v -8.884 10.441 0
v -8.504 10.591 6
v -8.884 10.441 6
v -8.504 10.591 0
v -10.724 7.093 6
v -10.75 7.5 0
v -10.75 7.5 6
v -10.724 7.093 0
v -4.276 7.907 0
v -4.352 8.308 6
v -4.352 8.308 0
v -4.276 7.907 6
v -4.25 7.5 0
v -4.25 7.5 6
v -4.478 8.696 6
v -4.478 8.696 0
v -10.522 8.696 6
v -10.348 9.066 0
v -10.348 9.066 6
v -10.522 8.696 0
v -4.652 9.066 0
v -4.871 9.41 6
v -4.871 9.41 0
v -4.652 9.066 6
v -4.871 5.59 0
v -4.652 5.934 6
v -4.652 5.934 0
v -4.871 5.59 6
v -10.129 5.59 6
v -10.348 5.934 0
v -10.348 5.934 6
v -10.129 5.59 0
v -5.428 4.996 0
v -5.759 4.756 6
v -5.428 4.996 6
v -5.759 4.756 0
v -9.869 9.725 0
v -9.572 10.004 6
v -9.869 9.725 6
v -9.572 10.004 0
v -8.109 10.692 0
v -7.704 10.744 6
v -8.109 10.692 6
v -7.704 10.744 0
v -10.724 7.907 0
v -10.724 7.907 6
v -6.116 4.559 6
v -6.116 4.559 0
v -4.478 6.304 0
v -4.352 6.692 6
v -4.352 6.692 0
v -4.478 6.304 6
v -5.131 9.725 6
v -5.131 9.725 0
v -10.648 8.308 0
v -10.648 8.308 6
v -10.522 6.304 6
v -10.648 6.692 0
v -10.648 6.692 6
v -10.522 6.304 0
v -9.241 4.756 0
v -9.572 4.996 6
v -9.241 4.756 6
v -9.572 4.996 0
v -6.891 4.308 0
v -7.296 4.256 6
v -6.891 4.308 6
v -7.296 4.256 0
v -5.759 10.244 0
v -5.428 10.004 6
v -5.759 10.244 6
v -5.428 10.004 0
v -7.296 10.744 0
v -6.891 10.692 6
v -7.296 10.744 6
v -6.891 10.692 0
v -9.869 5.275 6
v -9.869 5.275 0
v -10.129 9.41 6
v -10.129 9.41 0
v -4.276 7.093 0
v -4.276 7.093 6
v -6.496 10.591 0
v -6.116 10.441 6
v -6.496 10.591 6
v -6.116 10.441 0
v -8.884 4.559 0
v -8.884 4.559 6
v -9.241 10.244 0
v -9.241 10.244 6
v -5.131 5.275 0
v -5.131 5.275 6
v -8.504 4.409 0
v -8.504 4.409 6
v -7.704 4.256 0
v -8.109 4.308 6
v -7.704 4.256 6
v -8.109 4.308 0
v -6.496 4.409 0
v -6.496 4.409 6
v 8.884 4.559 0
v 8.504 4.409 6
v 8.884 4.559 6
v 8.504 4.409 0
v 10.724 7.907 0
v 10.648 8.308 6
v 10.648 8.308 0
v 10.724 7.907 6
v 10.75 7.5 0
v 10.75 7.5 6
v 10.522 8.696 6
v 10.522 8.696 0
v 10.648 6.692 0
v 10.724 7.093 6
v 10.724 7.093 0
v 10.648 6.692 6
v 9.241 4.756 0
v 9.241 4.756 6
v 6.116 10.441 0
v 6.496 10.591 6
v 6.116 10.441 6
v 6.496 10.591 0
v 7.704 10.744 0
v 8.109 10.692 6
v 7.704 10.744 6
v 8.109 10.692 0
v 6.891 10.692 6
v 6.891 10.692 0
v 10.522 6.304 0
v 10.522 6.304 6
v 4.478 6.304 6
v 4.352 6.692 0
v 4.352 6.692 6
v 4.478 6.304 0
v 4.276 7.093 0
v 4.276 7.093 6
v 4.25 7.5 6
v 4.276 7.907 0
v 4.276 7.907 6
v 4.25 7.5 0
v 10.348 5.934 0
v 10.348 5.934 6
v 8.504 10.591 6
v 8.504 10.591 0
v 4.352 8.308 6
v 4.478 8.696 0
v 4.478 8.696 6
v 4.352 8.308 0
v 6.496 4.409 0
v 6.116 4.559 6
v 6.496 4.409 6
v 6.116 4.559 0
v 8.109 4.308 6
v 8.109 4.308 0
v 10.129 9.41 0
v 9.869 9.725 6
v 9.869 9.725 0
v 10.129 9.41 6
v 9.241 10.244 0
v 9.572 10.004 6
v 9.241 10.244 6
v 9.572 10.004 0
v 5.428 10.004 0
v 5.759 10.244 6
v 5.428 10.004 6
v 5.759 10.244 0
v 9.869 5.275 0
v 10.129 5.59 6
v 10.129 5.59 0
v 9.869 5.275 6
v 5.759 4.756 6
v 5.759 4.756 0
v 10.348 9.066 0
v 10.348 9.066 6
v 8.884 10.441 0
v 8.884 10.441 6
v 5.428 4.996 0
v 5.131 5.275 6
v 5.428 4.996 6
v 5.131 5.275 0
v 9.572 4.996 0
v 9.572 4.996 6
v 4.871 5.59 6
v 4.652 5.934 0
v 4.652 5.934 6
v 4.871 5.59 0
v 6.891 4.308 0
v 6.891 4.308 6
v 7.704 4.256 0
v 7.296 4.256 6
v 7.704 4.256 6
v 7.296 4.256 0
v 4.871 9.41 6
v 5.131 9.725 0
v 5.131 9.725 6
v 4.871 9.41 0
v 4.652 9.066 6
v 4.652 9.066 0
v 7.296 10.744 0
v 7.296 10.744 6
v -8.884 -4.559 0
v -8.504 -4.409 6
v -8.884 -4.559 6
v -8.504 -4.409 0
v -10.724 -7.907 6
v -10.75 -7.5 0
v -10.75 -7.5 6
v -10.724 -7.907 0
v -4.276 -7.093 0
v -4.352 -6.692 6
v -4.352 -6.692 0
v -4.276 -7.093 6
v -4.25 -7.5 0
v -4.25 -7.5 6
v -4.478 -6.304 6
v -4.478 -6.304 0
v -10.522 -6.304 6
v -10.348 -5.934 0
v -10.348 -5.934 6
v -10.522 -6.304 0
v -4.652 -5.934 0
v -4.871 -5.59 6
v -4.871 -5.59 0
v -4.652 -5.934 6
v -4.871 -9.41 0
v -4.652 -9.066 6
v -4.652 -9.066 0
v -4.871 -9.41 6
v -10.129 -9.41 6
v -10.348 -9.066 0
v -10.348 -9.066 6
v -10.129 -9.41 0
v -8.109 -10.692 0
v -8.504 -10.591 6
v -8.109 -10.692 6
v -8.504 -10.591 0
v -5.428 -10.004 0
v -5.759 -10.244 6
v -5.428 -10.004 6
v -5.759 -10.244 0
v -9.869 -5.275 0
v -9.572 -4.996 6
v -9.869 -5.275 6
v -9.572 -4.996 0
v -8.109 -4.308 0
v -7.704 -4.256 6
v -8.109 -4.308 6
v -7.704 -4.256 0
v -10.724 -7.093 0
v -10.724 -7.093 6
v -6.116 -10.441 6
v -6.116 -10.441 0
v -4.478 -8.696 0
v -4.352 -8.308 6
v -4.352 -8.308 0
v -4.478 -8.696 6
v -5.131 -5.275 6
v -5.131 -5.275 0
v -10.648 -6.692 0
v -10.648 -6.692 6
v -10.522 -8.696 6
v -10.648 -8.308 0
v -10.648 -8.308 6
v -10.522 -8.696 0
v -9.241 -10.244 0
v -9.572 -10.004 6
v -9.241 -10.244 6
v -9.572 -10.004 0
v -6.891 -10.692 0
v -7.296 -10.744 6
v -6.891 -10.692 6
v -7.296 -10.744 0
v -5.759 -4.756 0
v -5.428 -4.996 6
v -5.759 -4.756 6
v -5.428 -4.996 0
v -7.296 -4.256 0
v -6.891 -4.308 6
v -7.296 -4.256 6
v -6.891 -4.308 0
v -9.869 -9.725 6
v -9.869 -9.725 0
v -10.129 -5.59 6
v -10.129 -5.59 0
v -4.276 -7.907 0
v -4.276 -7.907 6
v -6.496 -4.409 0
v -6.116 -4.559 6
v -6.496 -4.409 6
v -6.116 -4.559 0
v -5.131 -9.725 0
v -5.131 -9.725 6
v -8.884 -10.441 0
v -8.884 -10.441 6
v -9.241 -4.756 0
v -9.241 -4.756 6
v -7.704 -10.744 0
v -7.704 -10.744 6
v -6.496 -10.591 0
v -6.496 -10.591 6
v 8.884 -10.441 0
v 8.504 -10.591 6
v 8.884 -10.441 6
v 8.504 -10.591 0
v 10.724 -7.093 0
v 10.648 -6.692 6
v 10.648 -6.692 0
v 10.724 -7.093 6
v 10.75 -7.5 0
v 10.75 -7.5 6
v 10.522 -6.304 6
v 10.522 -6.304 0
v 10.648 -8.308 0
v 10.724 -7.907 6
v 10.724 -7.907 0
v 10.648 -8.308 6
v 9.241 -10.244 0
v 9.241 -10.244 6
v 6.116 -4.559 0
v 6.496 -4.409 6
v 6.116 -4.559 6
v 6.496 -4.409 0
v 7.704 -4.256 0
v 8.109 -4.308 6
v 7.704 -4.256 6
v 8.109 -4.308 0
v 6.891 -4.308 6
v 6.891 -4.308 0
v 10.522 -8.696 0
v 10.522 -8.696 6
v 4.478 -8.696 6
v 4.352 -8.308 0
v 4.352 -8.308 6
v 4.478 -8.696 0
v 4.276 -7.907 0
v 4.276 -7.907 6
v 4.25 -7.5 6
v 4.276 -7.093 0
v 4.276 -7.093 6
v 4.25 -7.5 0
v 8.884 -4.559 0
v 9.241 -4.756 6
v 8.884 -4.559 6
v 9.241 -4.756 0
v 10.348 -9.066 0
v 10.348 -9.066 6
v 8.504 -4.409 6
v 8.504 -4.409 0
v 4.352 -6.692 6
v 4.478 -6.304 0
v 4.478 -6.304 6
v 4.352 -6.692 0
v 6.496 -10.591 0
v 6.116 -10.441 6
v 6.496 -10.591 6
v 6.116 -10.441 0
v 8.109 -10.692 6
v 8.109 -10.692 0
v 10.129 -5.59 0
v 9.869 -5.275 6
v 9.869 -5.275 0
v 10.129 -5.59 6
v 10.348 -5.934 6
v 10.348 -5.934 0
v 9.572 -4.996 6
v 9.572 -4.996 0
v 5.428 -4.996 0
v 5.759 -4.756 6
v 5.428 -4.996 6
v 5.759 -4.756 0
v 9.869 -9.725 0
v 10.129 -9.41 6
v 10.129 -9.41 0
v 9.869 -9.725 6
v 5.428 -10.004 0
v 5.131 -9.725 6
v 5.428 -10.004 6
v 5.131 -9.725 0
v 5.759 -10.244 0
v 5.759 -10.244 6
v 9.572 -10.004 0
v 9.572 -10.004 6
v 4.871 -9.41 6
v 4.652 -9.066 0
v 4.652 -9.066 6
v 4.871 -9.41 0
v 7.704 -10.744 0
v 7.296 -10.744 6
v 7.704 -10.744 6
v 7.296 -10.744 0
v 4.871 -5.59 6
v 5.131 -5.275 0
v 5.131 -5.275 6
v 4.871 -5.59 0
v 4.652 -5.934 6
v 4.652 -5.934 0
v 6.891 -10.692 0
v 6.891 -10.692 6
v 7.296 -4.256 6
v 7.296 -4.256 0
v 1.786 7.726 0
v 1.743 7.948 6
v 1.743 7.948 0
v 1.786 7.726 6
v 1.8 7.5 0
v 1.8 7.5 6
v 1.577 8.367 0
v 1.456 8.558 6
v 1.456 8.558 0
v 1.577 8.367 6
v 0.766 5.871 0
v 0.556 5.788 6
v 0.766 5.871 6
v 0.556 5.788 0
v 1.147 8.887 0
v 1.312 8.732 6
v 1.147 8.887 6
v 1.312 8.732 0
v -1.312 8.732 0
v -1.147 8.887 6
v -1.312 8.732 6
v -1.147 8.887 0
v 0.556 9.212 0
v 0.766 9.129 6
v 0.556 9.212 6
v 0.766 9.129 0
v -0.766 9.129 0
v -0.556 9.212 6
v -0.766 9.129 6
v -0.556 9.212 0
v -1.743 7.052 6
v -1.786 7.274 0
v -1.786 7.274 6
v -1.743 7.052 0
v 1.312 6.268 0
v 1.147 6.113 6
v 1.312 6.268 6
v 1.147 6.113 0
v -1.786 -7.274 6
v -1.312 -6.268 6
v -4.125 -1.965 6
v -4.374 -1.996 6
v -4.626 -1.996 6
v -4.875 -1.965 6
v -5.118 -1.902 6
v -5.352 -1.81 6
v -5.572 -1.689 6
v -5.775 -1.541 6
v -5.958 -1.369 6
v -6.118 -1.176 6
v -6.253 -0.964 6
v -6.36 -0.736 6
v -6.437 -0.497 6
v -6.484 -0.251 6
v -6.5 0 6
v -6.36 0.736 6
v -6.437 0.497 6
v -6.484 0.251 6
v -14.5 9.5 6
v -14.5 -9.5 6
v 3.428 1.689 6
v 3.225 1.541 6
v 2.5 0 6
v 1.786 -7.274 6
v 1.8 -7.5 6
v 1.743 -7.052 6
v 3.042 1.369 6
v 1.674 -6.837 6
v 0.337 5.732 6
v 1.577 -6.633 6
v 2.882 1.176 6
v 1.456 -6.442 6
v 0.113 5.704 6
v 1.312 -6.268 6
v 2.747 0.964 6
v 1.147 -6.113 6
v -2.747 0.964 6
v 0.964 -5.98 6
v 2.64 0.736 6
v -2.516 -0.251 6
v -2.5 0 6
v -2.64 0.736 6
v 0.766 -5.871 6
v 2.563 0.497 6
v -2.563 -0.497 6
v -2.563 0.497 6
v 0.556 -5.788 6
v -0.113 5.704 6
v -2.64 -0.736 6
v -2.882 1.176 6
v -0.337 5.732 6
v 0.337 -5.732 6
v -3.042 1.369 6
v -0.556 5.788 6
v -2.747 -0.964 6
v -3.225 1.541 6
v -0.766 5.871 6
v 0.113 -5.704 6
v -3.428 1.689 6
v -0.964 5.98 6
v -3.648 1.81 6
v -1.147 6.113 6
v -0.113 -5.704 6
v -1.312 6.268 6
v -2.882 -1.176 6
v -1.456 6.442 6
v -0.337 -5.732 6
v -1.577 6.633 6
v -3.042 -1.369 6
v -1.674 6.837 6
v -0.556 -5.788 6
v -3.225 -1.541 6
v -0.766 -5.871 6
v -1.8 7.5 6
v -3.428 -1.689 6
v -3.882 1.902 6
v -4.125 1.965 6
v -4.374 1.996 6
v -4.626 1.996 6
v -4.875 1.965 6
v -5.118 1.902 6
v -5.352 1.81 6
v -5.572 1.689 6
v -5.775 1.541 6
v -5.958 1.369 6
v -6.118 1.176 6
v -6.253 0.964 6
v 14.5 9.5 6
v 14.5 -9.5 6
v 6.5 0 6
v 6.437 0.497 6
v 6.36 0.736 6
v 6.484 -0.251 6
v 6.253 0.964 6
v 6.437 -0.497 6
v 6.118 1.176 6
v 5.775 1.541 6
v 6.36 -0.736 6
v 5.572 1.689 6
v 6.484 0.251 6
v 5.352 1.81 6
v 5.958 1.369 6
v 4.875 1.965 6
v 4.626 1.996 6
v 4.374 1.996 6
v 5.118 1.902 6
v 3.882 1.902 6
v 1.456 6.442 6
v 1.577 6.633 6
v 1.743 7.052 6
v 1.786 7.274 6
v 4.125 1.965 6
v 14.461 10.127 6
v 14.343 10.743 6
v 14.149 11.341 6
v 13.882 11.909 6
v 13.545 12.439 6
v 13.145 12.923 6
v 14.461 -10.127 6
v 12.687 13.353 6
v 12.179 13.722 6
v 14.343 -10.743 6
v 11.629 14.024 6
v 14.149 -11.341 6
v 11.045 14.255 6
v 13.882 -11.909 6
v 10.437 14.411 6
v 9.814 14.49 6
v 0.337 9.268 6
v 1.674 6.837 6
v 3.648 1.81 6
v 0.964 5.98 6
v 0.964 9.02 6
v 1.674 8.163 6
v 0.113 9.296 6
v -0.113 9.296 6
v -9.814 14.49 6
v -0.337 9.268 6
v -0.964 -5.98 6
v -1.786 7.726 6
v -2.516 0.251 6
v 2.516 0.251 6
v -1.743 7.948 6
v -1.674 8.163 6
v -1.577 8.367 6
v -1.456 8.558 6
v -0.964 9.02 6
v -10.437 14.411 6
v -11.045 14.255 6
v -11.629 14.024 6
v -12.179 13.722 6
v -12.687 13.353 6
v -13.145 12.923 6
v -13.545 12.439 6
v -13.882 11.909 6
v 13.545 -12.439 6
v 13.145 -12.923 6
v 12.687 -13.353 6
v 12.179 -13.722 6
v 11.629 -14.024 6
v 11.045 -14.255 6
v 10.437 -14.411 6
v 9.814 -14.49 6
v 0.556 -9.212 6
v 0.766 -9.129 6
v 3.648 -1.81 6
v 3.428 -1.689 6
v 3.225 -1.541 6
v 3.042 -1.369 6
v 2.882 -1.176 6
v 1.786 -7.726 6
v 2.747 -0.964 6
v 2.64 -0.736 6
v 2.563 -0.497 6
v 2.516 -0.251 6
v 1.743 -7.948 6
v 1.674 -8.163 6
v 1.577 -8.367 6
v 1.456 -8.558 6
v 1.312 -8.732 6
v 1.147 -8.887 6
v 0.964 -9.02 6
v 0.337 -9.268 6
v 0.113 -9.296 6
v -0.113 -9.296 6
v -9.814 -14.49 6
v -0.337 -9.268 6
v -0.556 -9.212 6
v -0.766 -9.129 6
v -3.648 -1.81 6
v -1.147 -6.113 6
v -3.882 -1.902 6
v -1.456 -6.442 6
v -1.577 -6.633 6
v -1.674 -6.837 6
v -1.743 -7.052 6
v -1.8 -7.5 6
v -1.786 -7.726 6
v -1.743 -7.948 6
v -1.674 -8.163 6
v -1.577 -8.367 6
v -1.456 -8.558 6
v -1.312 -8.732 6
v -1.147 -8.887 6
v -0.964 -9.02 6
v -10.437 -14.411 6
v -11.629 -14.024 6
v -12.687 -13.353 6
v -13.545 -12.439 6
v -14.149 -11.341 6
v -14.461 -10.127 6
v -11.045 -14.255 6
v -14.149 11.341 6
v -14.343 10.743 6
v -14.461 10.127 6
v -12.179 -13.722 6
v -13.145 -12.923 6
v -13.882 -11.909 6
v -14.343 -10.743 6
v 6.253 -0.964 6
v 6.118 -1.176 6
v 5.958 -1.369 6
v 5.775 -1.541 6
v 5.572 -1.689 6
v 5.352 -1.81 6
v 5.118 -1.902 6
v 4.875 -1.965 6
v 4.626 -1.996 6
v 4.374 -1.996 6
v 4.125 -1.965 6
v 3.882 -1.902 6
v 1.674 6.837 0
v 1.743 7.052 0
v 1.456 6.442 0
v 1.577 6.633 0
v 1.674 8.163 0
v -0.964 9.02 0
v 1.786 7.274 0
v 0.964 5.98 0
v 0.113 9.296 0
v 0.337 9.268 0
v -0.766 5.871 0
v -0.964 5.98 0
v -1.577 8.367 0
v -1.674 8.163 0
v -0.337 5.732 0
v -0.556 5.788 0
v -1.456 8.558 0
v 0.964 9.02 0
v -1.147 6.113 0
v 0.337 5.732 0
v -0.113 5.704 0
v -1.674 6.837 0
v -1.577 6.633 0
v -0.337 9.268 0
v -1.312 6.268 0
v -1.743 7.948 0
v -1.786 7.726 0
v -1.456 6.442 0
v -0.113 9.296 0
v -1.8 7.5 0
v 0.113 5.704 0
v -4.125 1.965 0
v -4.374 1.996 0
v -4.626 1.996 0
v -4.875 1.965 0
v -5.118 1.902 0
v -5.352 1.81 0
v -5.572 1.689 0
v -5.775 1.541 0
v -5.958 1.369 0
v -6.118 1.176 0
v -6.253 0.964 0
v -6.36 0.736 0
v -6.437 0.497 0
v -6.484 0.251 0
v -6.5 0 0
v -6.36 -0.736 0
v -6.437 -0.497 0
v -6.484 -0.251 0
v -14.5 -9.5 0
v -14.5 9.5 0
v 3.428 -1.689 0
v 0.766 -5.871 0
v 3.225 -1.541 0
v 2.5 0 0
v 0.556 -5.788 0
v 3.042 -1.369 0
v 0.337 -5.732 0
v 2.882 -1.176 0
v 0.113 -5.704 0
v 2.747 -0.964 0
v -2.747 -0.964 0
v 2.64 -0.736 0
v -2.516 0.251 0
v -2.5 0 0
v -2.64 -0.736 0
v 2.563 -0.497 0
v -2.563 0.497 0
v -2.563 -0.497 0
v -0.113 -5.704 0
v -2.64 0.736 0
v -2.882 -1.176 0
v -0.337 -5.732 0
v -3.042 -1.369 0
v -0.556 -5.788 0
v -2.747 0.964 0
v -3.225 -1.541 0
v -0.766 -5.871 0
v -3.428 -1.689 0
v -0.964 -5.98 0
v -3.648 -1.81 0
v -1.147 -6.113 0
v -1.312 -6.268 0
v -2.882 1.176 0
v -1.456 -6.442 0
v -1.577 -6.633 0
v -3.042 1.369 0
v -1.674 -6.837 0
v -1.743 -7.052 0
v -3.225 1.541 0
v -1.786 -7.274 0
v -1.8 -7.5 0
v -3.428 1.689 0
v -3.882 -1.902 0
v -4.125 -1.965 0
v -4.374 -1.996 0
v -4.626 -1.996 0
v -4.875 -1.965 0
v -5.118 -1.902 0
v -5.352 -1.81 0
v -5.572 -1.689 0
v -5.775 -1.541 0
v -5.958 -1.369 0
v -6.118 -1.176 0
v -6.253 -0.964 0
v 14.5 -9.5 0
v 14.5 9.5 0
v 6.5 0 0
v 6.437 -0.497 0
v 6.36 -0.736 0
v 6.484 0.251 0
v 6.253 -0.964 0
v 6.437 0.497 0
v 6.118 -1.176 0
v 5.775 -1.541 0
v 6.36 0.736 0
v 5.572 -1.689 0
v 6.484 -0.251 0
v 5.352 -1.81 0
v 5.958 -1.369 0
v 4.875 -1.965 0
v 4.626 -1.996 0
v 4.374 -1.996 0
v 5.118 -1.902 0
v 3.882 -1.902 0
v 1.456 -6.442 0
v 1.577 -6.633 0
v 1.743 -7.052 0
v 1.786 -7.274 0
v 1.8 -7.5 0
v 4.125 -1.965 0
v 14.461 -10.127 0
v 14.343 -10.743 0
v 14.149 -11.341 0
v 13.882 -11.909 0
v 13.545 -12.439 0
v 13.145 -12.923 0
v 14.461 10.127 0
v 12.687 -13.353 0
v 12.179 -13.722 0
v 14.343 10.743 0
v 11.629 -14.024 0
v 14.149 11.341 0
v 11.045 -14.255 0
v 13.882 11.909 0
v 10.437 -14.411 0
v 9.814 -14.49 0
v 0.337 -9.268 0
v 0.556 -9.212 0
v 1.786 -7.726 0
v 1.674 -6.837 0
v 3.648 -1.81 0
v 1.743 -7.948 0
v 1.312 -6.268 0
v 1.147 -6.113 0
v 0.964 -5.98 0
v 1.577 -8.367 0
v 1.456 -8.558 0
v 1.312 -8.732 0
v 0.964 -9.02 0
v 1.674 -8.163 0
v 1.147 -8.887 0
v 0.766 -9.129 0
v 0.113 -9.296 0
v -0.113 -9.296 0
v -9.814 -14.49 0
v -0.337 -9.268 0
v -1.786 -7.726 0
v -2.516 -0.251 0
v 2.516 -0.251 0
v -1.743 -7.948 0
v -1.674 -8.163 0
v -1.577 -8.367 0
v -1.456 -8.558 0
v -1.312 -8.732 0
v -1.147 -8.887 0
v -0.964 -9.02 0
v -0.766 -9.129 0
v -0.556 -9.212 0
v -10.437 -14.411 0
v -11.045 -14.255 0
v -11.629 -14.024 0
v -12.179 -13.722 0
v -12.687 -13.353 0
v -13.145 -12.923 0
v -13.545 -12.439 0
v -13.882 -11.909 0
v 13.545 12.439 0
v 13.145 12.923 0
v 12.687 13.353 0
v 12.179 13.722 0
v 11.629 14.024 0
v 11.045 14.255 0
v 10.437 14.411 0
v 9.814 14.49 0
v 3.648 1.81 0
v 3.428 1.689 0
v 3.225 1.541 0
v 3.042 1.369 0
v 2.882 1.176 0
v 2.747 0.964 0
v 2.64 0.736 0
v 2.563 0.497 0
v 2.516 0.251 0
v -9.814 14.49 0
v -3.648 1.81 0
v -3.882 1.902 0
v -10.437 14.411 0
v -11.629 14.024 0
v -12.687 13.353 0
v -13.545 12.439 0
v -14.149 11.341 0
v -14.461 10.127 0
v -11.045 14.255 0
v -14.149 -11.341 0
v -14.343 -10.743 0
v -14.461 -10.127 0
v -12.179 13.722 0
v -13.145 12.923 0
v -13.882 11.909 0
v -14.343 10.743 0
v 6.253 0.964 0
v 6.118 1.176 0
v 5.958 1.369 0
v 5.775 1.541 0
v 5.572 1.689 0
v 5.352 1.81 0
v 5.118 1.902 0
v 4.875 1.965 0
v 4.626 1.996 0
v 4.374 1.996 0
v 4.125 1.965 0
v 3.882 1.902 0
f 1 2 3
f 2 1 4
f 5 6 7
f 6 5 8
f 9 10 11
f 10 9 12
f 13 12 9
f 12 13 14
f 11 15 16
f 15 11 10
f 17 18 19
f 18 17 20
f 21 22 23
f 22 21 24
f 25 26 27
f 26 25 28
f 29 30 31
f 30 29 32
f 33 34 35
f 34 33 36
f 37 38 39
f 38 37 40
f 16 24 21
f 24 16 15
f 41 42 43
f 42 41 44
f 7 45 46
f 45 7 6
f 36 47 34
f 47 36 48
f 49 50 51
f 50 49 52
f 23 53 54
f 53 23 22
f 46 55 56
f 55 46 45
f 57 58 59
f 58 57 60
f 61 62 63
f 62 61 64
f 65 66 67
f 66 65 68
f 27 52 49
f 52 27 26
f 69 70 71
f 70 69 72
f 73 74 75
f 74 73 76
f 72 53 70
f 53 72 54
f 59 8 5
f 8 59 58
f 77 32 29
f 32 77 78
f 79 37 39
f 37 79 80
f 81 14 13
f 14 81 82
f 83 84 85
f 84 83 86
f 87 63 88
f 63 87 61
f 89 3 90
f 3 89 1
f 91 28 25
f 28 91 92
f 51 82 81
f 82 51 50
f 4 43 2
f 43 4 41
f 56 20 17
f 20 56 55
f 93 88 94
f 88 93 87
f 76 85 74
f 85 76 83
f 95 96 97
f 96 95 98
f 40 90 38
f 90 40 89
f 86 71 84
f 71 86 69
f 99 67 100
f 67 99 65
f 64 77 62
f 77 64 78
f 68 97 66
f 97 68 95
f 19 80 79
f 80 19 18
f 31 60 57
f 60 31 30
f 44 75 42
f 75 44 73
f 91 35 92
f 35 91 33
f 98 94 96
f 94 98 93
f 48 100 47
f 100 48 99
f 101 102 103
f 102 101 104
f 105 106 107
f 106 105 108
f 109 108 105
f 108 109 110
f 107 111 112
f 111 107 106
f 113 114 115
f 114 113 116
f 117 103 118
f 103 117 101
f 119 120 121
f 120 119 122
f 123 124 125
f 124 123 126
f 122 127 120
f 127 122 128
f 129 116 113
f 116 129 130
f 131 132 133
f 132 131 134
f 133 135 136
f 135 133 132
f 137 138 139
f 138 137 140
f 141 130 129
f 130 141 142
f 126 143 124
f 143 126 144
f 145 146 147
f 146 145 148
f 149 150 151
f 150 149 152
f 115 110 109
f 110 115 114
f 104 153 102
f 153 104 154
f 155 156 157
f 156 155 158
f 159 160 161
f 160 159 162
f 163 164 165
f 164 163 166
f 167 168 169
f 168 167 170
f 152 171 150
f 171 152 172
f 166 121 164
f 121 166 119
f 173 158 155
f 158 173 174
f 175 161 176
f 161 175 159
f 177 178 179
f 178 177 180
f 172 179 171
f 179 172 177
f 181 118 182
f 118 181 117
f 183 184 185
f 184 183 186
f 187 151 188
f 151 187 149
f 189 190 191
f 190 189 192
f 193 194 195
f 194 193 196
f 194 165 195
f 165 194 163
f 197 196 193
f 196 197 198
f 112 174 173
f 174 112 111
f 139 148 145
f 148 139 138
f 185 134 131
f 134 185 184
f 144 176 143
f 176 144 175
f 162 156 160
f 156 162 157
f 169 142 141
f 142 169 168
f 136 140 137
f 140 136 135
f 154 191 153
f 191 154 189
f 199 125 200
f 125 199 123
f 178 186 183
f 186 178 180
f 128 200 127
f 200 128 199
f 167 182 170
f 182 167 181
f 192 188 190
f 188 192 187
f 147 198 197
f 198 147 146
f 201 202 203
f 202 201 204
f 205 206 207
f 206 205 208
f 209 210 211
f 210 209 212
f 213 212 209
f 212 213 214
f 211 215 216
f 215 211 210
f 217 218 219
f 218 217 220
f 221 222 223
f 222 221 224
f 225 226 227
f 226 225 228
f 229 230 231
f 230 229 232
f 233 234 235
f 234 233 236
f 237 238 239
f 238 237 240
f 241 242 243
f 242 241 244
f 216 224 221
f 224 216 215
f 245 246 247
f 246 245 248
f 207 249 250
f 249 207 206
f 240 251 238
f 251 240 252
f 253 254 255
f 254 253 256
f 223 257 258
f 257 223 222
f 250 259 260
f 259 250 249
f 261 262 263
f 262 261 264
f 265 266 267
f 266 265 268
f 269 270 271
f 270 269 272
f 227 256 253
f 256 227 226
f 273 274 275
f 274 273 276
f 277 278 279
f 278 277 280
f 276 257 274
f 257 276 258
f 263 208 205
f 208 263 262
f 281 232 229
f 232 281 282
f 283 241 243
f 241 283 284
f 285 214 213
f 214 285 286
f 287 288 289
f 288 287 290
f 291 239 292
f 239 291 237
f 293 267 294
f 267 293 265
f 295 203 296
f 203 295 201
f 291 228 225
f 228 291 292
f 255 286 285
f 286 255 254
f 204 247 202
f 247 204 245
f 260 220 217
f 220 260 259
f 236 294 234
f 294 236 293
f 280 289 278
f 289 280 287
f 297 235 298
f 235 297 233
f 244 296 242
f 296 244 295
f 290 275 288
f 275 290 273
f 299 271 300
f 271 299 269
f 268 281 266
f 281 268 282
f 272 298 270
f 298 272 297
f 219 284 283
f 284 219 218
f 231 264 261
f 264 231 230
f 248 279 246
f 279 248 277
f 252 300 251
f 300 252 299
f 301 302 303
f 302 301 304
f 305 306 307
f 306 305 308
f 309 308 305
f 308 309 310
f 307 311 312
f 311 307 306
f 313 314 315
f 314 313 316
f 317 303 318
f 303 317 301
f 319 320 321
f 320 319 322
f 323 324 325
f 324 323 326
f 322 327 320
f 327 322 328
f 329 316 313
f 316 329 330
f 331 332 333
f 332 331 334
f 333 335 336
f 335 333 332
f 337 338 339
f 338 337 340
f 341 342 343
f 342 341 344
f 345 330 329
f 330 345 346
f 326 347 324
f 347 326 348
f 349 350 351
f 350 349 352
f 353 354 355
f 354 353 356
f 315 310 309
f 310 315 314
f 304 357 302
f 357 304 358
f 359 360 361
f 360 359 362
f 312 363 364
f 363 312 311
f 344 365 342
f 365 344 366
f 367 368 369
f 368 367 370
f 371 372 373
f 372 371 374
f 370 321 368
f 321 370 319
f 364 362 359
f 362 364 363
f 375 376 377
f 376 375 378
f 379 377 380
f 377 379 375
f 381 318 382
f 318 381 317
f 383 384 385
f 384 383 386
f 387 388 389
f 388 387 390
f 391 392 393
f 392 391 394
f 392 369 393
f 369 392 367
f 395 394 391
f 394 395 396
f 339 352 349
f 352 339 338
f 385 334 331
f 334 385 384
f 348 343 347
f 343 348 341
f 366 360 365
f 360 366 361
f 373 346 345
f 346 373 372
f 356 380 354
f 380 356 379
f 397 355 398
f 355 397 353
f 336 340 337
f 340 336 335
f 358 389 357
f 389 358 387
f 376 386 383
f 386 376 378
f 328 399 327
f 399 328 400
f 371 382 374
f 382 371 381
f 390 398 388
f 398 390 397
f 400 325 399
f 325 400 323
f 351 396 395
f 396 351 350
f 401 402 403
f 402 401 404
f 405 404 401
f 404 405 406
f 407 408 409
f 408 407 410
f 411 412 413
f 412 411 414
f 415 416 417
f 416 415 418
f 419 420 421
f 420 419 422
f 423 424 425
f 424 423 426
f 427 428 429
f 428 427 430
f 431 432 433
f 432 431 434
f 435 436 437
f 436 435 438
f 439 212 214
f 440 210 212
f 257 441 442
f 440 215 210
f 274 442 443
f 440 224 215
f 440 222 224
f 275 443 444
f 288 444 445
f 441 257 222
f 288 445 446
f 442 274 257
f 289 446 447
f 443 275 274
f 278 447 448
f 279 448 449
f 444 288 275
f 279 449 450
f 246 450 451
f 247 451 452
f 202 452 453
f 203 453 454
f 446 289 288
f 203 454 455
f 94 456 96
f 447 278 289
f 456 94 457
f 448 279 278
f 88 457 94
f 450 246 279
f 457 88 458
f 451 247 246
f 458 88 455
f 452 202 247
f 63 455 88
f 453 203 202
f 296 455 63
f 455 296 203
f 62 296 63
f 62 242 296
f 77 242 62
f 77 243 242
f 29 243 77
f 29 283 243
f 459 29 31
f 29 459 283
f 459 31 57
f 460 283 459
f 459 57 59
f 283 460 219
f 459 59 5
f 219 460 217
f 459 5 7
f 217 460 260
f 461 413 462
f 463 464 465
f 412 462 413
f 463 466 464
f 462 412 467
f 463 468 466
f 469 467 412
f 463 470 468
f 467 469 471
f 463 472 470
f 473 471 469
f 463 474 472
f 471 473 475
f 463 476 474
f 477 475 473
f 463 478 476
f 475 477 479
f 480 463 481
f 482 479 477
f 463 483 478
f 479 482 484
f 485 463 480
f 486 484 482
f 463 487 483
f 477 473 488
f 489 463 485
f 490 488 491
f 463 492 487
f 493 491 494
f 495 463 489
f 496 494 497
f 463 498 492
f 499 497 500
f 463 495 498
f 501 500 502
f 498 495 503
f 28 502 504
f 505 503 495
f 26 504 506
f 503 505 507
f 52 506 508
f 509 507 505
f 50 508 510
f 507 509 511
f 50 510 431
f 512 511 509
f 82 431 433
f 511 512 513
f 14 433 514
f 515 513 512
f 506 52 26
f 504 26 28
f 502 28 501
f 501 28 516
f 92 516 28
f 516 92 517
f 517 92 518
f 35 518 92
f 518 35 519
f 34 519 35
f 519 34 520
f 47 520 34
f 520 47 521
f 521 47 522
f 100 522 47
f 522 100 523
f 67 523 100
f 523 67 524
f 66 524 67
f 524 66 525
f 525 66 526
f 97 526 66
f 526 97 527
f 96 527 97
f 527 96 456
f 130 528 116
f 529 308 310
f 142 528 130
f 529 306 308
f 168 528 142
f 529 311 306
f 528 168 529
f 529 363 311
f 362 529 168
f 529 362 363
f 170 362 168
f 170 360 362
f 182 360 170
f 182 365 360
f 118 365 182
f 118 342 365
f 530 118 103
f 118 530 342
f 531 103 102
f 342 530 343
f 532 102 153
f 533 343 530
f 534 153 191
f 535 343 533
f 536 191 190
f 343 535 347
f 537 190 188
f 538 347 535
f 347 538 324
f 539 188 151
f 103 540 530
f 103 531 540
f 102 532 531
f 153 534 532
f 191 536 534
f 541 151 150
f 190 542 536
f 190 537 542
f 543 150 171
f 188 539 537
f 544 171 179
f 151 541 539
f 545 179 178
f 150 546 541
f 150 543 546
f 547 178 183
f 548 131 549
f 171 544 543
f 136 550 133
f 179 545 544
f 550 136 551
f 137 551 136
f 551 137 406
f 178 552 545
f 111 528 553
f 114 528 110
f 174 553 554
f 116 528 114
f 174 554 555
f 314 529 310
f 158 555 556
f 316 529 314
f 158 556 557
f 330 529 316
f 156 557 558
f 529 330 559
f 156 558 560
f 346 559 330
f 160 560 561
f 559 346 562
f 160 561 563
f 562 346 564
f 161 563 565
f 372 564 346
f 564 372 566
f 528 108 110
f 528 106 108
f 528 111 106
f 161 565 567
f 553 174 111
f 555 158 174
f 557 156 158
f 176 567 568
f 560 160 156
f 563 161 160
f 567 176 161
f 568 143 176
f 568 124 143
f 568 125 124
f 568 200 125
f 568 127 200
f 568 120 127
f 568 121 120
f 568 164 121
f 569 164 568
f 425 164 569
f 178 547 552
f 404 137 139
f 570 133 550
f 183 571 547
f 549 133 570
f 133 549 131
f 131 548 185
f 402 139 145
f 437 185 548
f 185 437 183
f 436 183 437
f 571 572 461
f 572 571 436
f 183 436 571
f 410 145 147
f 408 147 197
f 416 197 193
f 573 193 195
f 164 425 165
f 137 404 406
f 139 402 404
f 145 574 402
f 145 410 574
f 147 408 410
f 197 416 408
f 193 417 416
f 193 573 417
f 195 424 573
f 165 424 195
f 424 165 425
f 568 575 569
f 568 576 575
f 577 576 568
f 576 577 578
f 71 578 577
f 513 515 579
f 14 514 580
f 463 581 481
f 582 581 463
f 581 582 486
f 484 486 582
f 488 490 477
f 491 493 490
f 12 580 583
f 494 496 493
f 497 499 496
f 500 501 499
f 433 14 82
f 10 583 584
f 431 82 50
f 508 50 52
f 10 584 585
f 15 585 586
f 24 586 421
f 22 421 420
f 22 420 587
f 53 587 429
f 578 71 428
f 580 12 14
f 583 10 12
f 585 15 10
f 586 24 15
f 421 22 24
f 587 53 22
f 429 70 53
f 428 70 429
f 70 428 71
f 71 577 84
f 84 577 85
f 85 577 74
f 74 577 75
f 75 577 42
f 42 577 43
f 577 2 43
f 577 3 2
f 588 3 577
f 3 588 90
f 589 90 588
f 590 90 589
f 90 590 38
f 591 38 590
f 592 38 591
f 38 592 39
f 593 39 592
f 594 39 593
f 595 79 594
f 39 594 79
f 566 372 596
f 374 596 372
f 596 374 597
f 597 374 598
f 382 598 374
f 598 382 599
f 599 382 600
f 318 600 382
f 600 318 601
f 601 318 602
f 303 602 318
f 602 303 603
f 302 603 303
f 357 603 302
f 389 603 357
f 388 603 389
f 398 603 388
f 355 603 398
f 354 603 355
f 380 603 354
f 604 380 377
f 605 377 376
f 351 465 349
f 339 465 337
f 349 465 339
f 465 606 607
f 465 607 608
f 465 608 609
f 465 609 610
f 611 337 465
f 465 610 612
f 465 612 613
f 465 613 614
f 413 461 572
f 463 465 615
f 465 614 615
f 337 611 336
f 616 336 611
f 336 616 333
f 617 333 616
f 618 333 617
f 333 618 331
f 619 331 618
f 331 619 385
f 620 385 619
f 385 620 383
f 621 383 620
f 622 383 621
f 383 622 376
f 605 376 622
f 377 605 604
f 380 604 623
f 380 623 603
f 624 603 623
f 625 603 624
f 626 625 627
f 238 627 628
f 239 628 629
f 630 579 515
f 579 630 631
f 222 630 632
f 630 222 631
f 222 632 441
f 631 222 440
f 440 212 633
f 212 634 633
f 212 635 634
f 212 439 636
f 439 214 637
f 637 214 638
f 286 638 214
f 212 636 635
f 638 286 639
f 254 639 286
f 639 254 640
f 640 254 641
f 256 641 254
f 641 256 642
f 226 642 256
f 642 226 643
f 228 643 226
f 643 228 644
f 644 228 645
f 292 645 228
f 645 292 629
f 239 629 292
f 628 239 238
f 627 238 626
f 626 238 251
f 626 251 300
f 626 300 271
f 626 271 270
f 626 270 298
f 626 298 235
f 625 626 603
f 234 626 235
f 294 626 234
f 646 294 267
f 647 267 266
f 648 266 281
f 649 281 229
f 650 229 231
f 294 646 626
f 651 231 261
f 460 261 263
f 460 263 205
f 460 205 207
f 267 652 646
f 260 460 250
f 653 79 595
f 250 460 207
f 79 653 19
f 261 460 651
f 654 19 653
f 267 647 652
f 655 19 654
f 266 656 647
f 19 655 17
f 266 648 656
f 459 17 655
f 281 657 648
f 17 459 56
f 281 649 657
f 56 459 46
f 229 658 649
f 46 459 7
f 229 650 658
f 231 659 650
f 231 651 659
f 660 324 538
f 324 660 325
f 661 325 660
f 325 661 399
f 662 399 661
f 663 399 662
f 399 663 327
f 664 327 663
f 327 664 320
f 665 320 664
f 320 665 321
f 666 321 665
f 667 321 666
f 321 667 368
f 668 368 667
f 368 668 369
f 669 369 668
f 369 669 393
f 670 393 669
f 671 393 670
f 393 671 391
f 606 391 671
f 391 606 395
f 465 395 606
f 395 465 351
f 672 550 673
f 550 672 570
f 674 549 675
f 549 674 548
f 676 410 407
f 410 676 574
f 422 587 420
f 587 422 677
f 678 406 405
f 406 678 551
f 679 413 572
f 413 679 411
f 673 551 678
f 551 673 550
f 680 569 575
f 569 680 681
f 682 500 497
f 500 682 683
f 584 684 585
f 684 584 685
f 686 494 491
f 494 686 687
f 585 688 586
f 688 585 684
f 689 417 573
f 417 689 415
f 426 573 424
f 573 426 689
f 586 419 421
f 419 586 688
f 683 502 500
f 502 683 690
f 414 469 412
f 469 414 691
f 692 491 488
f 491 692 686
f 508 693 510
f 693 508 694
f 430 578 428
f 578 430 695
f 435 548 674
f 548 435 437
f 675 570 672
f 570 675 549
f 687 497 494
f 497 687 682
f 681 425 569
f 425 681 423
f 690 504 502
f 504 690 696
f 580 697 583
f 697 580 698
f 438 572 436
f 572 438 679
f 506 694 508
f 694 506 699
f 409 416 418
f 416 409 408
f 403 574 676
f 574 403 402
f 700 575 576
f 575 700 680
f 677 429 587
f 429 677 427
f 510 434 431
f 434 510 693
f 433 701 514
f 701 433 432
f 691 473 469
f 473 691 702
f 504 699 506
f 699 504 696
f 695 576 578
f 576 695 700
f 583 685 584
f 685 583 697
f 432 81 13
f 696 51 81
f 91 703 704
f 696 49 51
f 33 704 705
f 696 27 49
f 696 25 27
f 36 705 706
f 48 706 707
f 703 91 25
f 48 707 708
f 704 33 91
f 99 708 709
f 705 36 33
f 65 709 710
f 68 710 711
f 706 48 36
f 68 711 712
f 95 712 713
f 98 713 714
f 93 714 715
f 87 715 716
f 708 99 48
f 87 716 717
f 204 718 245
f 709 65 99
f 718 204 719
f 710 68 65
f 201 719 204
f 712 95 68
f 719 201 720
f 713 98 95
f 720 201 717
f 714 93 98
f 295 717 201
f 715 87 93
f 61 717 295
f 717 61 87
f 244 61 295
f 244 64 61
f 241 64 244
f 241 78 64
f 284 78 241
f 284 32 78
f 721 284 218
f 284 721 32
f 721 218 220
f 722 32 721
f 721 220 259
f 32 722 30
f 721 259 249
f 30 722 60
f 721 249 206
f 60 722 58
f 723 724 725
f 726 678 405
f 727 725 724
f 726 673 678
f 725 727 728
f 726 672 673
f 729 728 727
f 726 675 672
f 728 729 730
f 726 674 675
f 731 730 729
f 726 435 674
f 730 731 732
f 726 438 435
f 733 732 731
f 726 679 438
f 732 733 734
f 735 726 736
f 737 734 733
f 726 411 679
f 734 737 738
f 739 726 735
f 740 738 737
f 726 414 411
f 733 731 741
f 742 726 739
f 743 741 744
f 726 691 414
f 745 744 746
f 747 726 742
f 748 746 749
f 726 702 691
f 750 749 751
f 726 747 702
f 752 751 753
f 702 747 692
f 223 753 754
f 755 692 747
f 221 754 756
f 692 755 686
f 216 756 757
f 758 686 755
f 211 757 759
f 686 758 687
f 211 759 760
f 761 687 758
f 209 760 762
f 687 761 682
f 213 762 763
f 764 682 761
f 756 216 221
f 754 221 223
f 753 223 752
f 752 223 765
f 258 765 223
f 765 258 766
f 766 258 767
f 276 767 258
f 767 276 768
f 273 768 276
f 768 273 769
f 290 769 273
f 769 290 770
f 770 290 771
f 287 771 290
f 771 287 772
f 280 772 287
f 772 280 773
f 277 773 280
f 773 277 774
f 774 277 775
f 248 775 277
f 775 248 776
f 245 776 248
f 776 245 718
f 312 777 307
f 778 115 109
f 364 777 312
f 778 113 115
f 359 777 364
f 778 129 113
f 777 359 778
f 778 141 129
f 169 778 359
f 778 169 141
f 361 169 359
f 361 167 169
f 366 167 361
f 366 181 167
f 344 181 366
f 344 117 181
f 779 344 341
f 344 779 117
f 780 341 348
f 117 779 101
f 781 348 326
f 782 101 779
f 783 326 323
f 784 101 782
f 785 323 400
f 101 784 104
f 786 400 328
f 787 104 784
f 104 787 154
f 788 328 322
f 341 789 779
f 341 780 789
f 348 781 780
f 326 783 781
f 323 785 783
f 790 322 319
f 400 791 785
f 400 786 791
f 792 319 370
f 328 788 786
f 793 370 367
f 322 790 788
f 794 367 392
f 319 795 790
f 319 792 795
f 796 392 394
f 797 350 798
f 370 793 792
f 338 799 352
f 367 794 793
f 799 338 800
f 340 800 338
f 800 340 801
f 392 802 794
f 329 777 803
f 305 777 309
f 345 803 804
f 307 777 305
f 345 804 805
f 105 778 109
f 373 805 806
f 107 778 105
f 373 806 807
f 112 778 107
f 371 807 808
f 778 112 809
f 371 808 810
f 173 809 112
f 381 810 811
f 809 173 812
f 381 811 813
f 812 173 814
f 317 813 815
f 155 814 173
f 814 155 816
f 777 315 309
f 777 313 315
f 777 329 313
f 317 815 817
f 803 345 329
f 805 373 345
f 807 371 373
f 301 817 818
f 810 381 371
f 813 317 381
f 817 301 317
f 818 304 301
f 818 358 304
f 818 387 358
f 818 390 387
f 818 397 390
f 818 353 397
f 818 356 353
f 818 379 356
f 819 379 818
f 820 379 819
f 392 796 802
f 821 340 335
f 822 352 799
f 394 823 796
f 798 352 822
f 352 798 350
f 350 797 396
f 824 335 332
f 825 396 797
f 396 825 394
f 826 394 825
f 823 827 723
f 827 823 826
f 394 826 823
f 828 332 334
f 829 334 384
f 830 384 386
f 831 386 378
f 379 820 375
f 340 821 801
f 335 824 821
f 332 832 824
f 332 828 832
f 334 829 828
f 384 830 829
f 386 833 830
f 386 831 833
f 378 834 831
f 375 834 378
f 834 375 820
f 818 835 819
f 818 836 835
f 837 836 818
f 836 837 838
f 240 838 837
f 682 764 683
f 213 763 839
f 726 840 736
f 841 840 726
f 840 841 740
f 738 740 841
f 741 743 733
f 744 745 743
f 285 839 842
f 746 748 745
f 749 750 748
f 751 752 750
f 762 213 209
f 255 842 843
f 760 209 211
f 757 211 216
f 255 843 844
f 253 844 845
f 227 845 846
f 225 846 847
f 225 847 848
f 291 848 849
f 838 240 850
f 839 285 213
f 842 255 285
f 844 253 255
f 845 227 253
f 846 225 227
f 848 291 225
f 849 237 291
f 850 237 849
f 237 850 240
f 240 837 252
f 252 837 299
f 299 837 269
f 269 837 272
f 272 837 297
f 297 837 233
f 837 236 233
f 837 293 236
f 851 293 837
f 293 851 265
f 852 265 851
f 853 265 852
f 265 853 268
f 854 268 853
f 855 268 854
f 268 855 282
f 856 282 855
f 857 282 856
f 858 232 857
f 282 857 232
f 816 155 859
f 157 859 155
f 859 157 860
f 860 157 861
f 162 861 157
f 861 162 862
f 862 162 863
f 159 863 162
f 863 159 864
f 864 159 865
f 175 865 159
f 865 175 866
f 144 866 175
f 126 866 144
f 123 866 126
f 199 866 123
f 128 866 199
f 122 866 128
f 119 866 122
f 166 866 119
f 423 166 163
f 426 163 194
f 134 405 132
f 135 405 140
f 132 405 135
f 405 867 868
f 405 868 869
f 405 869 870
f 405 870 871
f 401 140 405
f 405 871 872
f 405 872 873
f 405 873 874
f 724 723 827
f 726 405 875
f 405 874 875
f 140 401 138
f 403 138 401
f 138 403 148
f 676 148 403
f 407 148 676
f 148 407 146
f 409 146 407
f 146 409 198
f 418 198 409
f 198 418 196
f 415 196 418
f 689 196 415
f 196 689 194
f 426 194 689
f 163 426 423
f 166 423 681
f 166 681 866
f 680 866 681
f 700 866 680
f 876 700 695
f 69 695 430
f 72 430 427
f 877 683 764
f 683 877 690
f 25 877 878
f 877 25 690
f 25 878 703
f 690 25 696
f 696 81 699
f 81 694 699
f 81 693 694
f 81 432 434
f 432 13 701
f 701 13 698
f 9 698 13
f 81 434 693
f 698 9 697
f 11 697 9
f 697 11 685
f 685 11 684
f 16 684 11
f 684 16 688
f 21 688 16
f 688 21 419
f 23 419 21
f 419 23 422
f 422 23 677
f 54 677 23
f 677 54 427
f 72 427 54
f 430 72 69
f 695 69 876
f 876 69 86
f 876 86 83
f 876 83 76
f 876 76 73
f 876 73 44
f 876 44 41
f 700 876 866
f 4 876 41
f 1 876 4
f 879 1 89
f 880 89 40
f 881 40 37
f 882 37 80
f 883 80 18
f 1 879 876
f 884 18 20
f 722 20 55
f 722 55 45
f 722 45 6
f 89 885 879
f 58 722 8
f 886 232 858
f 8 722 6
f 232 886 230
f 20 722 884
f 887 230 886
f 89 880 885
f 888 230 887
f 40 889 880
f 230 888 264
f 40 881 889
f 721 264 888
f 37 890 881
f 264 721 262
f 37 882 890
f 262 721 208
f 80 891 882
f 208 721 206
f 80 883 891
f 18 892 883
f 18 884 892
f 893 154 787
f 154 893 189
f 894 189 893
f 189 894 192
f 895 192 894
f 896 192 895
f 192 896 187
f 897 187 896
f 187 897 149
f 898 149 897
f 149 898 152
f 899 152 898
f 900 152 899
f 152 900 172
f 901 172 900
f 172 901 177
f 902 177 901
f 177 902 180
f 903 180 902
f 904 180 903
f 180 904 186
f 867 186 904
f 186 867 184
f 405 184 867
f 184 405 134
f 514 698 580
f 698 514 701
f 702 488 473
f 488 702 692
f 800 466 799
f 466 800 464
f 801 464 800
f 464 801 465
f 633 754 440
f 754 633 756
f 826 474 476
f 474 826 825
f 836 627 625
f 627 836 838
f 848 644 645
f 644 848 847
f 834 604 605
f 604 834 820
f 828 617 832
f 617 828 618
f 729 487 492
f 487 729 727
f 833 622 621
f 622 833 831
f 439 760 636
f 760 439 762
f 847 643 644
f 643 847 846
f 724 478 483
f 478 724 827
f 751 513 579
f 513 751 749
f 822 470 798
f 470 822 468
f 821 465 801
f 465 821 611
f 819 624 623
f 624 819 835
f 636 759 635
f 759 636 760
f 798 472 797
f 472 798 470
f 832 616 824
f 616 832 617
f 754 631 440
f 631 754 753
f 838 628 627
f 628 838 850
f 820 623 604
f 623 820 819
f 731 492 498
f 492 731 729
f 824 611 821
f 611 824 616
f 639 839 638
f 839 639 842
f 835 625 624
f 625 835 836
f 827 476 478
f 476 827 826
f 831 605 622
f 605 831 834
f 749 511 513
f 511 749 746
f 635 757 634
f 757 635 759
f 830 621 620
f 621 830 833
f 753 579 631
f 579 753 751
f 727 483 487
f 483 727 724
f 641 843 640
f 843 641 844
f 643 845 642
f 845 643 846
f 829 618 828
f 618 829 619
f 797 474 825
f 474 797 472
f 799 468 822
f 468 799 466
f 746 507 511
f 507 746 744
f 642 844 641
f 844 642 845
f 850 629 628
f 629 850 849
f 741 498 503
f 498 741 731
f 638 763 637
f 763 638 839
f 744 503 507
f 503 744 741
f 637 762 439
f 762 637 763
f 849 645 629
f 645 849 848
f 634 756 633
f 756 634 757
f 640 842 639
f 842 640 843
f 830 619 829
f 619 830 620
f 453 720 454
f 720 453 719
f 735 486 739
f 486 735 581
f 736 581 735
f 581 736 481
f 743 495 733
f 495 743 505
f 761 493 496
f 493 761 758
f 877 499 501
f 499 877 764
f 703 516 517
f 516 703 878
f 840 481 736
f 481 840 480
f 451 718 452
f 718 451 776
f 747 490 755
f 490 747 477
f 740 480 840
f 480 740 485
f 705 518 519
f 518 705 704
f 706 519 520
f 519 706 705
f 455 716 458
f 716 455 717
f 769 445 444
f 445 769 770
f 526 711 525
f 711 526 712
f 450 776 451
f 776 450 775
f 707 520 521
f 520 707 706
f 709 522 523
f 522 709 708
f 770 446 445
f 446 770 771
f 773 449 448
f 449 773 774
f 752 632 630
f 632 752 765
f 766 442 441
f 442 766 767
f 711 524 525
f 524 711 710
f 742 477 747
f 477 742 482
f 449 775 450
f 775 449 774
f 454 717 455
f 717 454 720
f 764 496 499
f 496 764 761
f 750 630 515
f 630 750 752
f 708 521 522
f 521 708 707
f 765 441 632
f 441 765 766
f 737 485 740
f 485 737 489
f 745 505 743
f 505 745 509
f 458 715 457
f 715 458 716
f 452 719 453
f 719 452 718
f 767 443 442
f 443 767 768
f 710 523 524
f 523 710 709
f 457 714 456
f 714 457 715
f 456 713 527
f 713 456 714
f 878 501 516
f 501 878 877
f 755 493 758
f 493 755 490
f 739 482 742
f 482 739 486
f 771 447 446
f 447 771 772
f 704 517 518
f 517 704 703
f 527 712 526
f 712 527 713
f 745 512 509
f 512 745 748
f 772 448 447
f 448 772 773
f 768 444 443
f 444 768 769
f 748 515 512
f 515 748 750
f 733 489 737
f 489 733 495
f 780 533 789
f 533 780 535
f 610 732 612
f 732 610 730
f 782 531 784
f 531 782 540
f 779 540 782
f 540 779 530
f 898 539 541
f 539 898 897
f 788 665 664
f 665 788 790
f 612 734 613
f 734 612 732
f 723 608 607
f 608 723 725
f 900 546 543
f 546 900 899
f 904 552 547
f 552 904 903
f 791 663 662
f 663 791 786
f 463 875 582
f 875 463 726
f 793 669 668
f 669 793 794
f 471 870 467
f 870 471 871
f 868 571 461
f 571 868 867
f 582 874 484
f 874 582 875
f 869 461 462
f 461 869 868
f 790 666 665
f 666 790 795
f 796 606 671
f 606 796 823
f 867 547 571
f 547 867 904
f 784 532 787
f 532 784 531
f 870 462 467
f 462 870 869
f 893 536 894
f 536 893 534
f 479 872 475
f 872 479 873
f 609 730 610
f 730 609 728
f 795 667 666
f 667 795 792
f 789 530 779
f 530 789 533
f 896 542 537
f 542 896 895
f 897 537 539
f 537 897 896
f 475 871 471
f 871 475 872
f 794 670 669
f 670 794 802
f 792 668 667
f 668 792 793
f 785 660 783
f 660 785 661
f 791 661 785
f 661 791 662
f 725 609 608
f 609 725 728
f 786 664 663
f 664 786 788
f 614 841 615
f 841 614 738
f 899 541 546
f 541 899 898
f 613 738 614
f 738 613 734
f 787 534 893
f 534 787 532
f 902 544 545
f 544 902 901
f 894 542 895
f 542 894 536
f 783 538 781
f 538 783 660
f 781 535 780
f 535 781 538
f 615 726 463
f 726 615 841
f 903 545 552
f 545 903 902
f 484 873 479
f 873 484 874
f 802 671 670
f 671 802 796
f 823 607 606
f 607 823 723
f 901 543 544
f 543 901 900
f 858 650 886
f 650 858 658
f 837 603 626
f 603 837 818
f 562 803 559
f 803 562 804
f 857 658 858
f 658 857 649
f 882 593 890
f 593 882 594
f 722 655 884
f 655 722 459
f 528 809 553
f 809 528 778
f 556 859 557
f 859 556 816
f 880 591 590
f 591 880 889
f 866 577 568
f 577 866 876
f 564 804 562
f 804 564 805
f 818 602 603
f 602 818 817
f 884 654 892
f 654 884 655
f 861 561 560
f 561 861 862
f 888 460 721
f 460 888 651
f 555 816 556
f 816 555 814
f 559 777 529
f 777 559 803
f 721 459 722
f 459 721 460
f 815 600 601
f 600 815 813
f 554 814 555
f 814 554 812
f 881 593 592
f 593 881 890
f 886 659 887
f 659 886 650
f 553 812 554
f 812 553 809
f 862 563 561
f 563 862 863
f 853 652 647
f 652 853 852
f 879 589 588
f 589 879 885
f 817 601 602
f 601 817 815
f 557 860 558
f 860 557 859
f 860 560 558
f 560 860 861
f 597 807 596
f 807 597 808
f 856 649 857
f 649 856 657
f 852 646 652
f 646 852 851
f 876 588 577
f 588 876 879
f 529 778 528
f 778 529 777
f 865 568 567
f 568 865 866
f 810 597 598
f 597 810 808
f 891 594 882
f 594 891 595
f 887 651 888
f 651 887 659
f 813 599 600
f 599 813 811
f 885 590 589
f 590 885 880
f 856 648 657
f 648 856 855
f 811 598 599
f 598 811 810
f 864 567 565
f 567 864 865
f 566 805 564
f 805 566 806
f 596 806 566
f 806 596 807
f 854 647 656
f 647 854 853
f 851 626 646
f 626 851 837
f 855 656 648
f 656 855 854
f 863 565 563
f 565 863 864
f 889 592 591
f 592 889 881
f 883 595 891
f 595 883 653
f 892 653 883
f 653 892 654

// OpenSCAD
$fn = 50;


difference() {
	union() {
		hull() {
			translate(v = [-9.5000000000, 9.5000000000, 0]) {
				cylinder(h = 6, r = 5);
			}
			translate(v = [9.5000000000, 9.5000000000, 0]) {
				cylinder(h = 6, r = 5);
			}
			translate(v = [-9.5000000000, -9.5000000000, 0]) {
				cylinder(h = 6, r = 5);
			}
			translate(v = [9.5000000000, -9.5000000000, 0]) {
				cylinder(h = 6, r = 5);
			}
		}
	}
	union() {
		#translate(v = [-7.5000000000, 7.5000000000, 0]) {
			cylinder(h = 6, r = 3.2500000000);
		}
		#translate(v = [7.5000000000, 7.5000000000, 0]) {
			cylinder(h = 6, r = 3.2500000000);
		}
		#translate(v = [-7.5000000000, -7.5000000000, 0]) {
			cylinder(h = 6, r = 3.2500000000);
		}
		#translate(v = [7.5000000000, -7.5000000000, 0]) {
			cylinder(h = 6, r = 3.2500000000);
		}
		#translate(v = [-7.5000000000, -7.5000000000, -100.0000000000]) {
			cylinder(h = 200, r = 3.2500000000);
		}
		#translate(v = [-7.5000000000, 7.5000000000, -100.0000000000]) {
			cylinder(h = 200, r = 3.2500000000);
		}
		#translate(v = [7.5000000000, -7.5000000000, -100.0000000000]) {
			cylinder(h = 200, r = 3.2500000000);
		}
		#translate(v = [7.5000000000, 7.5000000000, -100.0000000000]) {
			cylinder(h = 200, r = 3.2500000000);
		}
		#translate(v = [-7.5000000000, 7.5000000000, 0]) {
			cylinder(h = 6, r = 1.8000000000);
		}
		#translate(v = [0.0000000000, 7.5000000000, 0]) {
			cylinder(h = 6, r = 1.8000000000);
		}
		#translate(v = [7.5000000000, 7.5000000000, 0]) {
			cylinder(h = 6, r = 1.8000000000);
		}
		#translate(v = [-7.5000000000, -7.5000000000, 0]) {
			cylinder(h = 6, r = 1.8000000000);
		}
		#translate(v = [0.0000000000, -7.5000000000, 0]) {
			cylinder(h = 6, r = 1.8000000000);
		}
		#translate(v = [7.5000000000, -7.5000000000, 0]) {
			cylinder(h = 6, r = 1.8000000000);
		}
		#translate(v = [-7.5000000000, 7.5000000000, 0]) {
			cylinder(h = 6, r = 1.8000000000);
		}
		#translate(v = [0.0000000000, 7.5000000000, 0]) {
			cylinder(h = 6, r = 1.8000000000);
		}
		#translate(v = [7.5000000000, 7.5000000000, 0]) {
			cylinder(h = 6, r = 1.8000000000);
		}
		#translate(v = [-7.5000000000, -7.5000000000, 0]) {
			cylinder(h = 6, r = 1.8000000000);
		}
		#translate(v = [0.0000000000, -7.5000000000, 0]) {
			cylinder(h = 6, r = 1.8000000000);
		}
		#translate(v = [7.5000000000, -7.5000000000, 0]) {
			cylinder(h = 6, r = 1.8000000000);
		}
		#translate(v = [-7.5000000000, 7.5000000000, 0]) {
			cylinder(h = 6, r = 1.8000000000);
		}
		#translate(v = [0.0000000000, 7.5000000000, 0]) {
			cylinder(h = 6, r = 1.8000000000);
		}
		#translate(v = [7.5000000000, 7.5000000000, 0]) {
			cylinder(h = 6, r = 1.8000000000);
		}
		#translate(v = [-7.5000000000, -7.5000000000, 0]) {
			cylinder(h = 6, r = 1.8000000000);
		}
		#translate(v = [0.0000000000, -7.5000000000, 0]) {
			cylinder(h = 6, r = 1.8000000000);
		}
		#translate(v = [7.5000000000, -7.5000000000, 0]) {
			cylinder(h = 6, r = 1.8000000000);
		}
		#translate(v = [-4.5000000000, 0, 0]) {
			cylinder(h = 6, r = 2.0000000000);
		}
		#translate(v = [4.5000000000, 0, 0]) {
			cylinder(h = 6, r = 2.0000000000);
		}
	}
}
